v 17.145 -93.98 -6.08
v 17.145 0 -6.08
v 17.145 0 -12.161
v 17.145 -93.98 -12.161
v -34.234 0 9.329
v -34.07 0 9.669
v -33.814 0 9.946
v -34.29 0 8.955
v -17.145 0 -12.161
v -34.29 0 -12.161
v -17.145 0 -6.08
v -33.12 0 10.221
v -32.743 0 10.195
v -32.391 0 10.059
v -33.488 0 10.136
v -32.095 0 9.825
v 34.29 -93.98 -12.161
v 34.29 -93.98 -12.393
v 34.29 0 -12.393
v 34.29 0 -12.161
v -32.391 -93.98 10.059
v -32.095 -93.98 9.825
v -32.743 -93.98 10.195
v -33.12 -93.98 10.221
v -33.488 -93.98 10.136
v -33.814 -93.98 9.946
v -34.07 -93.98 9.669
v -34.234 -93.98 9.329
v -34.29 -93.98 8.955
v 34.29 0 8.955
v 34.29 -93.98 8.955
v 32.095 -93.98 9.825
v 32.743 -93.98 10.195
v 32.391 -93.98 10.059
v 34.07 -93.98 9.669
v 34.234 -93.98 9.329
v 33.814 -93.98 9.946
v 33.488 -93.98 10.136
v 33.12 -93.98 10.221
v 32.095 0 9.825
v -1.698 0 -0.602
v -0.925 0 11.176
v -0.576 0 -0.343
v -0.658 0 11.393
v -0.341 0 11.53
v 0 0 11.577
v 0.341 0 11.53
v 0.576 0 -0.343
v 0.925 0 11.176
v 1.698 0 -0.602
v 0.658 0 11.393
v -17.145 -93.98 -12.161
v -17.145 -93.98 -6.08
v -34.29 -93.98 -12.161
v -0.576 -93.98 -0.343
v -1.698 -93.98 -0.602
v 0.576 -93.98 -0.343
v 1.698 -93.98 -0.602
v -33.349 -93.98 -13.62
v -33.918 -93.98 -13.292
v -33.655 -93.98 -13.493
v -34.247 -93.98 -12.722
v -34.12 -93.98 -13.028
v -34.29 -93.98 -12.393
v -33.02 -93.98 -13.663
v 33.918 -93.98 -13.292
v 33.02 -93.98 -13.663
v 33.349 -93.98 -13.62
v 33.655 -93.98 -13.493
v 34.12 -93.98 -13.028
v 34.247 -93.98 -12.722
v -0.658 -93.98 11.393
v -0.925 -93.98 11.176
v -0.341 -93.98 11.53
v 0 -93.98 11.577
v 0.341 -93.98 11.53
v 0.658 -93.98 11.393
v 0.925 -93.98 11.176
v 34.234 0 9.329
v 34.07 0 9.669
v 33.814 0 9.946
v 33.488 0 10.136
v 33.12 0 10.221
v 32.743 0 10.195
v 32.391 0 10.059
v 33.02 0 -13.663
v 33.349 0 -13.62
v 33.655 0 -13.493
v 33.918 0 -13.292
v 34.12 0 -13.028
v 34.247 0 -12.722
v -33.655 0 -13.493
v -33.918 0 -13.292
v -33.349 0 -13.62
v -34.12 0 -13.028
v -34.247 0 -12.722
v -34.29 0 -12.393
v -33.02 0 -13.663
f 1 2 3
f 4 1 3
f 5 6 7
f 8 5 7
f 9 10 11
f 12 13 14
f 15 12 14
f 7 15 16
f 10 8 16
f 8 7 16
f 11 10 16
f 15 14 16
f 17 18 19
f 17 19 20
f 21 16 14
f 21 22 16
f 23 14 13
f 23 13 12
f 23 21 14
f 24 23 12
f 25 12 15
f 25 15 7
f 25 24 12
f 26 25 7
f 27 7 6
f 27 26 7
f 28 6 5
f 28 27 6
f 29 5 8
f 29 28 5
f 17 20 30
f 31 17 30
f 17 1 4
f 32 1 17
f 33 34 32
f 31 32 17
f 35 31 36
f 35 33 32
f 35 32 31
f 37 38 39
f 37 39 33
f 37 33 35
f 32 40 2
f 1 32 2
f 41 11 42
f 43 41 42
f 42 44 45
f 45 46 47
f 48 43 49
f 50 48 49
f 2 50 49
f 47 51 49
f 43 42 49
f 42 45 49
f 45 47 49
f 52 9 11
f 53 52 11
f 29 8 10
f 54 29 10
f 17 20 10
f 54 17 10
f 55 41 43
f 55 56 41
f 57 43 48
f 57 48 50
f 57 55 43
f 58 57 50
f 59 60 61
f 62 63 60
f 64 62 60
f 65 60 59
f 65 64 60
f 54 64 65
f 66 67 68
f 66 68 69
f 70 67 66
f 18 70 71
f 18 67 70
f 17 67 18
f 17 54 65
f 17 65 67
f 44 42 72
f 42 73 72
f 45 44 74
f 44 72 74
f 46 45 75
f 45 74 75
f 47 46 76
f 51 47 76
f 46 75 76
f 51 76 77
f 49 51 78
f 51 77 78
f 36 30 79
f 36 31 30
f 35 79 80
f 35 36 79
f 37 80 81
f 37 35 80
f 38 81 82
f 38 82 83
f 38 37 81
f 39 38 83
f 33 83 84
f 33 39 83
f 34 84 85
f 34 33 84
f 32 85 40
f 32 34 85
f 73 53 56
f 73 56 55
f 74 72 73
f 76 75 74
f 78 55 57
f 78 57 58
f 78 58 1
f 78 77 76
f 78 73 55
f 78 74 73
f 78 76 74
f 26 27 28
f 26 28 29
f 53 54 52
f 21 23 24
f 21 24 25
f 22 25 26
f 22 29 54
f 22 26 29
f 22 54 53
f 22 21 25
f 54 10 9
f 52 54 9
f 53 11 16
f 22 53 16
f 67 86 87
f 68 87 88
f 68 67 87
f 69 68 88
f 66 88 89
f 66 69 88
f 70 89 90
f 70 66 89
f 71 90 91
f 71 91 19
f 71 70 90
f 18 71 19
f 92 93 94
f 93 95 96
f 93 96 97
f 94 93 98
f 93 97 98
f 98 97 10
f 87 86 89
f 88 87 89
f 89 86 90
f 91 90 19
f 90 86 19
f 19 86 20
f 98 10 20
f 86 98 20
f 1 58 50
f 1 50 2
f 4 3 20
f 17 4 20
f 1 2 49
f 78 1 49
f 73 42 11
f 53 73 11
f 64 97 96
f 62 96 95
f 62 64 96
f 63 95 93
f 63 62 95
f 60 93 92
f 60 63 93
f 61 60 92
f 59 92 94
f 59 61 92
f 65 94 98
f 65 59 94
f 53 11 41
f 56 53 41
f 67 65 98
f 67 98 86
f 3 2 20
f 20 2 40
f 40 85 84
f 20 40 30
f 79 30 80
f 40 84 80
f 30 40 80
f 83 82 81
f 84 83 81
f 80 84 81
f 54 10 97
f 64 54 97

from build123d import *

# Parameters (mm, degrees)
F1_DEPTH = 93.98
F3_DEPTH = 93.98
F4_R     = 5.08
F5_R     = 1.27
F6_R     = 1.27
F6_2_R   = 1.27
F6_3_R   = 1.27


# Not quite as in the source:
# - the program builds the solid bodies; features that only make, move or delete a surface that nothing else refers to are left out


with BuildPart() as f1:
    # F0 (on Front) → F1 (new body)
    with BuildSketch(Plane.XZ):
        Polygon((-17.145, -6.0804947455), (-34.29, 12.160989491), (-34.29, -12.160989491), align=None)
        Polygon((-17.145, -6.0804947455), (-34.29, -12.160989491), (-17.145, -12.160989491), align=None)
    extrude(amount=F1_DEPTH)

    # F5
    f5_edges = [f1.edges().sort_by_distance(p)[0] for p in [
        (-34.29, -46.99, 12.160989),
    ]]
    fillet(f5_edges, radius=F5_R)


with BuildPart() as f1b:
    # F0 (on Front) → F1, piece 2 (new body)
    with BuildSketch(Plane.XZ):
        Polygon((34.29, -12.160989491), (17.145, -6.0804947455), (17.145, -12.160989491), align=None)
        Polygon((34.29, -12.160989491), (34.29, 12.160989491), (17.145, -6.0804947455), align=None)
    extrude(amount=F1_DEPTH)

    # F6
    f6_edges = [f1b.edges().sort_by_distance(p)[0] for p in [
        (34.29, -46.99, 12.160989),
    ]]
    fillet(f6_edges, radius=F6_R)


with BuildPart() as f1c:
    # F0 (on Front) → F1, piece 3 (new body)
    with BuildSketch(Plane.XZ):
        Polygon((17.145, -6.0804947455), (0, 12.160989491), (-17.145, -6.0804947455), (0, 0), align=None)
    extrude(amount=F1_DEPTH)

    # F4
    f4_edges = [f1c.edges().sort_by_distance(p)[0] for p in [
        (0, -46.99, 0),
    ]]
    fillet(f4_edges, radius=F4_R)

    # F6#2
    f6_2_edges = [f1c.edges().sort_by_distance(p)[0] for p in [
        (0, -46.99, 12.160989),
    ]]
    fillet(f6_2_edges, radius=F6_2_R)


with BuildPart() as f3:
    # F0 (on Front) → F3 (new body)
    with BuildSketch(Plane.XZ):
        Polygon((-17.145, -12.160989491), (-34.29, -12.160989491), (-34.29, -13.663481921), (34.29, -13.663481921), (34.29, -12.160989491), (17.145, -12.160989491), align=None)
    extrude(amount=F3_DEPTH)

    # F6#3
    f6_3_edges = [f3.edges().sort_by_distance(p)[0] for p in [
        (-34.29, -46.99, -13.663482),
        (34.29, -46.99, -13.663482),
    ]]
    fillet(f6_3_edges, radius=F6_3_R)


solid = Compound([f1.part, f1b.part, f1c.part, f3.part])
